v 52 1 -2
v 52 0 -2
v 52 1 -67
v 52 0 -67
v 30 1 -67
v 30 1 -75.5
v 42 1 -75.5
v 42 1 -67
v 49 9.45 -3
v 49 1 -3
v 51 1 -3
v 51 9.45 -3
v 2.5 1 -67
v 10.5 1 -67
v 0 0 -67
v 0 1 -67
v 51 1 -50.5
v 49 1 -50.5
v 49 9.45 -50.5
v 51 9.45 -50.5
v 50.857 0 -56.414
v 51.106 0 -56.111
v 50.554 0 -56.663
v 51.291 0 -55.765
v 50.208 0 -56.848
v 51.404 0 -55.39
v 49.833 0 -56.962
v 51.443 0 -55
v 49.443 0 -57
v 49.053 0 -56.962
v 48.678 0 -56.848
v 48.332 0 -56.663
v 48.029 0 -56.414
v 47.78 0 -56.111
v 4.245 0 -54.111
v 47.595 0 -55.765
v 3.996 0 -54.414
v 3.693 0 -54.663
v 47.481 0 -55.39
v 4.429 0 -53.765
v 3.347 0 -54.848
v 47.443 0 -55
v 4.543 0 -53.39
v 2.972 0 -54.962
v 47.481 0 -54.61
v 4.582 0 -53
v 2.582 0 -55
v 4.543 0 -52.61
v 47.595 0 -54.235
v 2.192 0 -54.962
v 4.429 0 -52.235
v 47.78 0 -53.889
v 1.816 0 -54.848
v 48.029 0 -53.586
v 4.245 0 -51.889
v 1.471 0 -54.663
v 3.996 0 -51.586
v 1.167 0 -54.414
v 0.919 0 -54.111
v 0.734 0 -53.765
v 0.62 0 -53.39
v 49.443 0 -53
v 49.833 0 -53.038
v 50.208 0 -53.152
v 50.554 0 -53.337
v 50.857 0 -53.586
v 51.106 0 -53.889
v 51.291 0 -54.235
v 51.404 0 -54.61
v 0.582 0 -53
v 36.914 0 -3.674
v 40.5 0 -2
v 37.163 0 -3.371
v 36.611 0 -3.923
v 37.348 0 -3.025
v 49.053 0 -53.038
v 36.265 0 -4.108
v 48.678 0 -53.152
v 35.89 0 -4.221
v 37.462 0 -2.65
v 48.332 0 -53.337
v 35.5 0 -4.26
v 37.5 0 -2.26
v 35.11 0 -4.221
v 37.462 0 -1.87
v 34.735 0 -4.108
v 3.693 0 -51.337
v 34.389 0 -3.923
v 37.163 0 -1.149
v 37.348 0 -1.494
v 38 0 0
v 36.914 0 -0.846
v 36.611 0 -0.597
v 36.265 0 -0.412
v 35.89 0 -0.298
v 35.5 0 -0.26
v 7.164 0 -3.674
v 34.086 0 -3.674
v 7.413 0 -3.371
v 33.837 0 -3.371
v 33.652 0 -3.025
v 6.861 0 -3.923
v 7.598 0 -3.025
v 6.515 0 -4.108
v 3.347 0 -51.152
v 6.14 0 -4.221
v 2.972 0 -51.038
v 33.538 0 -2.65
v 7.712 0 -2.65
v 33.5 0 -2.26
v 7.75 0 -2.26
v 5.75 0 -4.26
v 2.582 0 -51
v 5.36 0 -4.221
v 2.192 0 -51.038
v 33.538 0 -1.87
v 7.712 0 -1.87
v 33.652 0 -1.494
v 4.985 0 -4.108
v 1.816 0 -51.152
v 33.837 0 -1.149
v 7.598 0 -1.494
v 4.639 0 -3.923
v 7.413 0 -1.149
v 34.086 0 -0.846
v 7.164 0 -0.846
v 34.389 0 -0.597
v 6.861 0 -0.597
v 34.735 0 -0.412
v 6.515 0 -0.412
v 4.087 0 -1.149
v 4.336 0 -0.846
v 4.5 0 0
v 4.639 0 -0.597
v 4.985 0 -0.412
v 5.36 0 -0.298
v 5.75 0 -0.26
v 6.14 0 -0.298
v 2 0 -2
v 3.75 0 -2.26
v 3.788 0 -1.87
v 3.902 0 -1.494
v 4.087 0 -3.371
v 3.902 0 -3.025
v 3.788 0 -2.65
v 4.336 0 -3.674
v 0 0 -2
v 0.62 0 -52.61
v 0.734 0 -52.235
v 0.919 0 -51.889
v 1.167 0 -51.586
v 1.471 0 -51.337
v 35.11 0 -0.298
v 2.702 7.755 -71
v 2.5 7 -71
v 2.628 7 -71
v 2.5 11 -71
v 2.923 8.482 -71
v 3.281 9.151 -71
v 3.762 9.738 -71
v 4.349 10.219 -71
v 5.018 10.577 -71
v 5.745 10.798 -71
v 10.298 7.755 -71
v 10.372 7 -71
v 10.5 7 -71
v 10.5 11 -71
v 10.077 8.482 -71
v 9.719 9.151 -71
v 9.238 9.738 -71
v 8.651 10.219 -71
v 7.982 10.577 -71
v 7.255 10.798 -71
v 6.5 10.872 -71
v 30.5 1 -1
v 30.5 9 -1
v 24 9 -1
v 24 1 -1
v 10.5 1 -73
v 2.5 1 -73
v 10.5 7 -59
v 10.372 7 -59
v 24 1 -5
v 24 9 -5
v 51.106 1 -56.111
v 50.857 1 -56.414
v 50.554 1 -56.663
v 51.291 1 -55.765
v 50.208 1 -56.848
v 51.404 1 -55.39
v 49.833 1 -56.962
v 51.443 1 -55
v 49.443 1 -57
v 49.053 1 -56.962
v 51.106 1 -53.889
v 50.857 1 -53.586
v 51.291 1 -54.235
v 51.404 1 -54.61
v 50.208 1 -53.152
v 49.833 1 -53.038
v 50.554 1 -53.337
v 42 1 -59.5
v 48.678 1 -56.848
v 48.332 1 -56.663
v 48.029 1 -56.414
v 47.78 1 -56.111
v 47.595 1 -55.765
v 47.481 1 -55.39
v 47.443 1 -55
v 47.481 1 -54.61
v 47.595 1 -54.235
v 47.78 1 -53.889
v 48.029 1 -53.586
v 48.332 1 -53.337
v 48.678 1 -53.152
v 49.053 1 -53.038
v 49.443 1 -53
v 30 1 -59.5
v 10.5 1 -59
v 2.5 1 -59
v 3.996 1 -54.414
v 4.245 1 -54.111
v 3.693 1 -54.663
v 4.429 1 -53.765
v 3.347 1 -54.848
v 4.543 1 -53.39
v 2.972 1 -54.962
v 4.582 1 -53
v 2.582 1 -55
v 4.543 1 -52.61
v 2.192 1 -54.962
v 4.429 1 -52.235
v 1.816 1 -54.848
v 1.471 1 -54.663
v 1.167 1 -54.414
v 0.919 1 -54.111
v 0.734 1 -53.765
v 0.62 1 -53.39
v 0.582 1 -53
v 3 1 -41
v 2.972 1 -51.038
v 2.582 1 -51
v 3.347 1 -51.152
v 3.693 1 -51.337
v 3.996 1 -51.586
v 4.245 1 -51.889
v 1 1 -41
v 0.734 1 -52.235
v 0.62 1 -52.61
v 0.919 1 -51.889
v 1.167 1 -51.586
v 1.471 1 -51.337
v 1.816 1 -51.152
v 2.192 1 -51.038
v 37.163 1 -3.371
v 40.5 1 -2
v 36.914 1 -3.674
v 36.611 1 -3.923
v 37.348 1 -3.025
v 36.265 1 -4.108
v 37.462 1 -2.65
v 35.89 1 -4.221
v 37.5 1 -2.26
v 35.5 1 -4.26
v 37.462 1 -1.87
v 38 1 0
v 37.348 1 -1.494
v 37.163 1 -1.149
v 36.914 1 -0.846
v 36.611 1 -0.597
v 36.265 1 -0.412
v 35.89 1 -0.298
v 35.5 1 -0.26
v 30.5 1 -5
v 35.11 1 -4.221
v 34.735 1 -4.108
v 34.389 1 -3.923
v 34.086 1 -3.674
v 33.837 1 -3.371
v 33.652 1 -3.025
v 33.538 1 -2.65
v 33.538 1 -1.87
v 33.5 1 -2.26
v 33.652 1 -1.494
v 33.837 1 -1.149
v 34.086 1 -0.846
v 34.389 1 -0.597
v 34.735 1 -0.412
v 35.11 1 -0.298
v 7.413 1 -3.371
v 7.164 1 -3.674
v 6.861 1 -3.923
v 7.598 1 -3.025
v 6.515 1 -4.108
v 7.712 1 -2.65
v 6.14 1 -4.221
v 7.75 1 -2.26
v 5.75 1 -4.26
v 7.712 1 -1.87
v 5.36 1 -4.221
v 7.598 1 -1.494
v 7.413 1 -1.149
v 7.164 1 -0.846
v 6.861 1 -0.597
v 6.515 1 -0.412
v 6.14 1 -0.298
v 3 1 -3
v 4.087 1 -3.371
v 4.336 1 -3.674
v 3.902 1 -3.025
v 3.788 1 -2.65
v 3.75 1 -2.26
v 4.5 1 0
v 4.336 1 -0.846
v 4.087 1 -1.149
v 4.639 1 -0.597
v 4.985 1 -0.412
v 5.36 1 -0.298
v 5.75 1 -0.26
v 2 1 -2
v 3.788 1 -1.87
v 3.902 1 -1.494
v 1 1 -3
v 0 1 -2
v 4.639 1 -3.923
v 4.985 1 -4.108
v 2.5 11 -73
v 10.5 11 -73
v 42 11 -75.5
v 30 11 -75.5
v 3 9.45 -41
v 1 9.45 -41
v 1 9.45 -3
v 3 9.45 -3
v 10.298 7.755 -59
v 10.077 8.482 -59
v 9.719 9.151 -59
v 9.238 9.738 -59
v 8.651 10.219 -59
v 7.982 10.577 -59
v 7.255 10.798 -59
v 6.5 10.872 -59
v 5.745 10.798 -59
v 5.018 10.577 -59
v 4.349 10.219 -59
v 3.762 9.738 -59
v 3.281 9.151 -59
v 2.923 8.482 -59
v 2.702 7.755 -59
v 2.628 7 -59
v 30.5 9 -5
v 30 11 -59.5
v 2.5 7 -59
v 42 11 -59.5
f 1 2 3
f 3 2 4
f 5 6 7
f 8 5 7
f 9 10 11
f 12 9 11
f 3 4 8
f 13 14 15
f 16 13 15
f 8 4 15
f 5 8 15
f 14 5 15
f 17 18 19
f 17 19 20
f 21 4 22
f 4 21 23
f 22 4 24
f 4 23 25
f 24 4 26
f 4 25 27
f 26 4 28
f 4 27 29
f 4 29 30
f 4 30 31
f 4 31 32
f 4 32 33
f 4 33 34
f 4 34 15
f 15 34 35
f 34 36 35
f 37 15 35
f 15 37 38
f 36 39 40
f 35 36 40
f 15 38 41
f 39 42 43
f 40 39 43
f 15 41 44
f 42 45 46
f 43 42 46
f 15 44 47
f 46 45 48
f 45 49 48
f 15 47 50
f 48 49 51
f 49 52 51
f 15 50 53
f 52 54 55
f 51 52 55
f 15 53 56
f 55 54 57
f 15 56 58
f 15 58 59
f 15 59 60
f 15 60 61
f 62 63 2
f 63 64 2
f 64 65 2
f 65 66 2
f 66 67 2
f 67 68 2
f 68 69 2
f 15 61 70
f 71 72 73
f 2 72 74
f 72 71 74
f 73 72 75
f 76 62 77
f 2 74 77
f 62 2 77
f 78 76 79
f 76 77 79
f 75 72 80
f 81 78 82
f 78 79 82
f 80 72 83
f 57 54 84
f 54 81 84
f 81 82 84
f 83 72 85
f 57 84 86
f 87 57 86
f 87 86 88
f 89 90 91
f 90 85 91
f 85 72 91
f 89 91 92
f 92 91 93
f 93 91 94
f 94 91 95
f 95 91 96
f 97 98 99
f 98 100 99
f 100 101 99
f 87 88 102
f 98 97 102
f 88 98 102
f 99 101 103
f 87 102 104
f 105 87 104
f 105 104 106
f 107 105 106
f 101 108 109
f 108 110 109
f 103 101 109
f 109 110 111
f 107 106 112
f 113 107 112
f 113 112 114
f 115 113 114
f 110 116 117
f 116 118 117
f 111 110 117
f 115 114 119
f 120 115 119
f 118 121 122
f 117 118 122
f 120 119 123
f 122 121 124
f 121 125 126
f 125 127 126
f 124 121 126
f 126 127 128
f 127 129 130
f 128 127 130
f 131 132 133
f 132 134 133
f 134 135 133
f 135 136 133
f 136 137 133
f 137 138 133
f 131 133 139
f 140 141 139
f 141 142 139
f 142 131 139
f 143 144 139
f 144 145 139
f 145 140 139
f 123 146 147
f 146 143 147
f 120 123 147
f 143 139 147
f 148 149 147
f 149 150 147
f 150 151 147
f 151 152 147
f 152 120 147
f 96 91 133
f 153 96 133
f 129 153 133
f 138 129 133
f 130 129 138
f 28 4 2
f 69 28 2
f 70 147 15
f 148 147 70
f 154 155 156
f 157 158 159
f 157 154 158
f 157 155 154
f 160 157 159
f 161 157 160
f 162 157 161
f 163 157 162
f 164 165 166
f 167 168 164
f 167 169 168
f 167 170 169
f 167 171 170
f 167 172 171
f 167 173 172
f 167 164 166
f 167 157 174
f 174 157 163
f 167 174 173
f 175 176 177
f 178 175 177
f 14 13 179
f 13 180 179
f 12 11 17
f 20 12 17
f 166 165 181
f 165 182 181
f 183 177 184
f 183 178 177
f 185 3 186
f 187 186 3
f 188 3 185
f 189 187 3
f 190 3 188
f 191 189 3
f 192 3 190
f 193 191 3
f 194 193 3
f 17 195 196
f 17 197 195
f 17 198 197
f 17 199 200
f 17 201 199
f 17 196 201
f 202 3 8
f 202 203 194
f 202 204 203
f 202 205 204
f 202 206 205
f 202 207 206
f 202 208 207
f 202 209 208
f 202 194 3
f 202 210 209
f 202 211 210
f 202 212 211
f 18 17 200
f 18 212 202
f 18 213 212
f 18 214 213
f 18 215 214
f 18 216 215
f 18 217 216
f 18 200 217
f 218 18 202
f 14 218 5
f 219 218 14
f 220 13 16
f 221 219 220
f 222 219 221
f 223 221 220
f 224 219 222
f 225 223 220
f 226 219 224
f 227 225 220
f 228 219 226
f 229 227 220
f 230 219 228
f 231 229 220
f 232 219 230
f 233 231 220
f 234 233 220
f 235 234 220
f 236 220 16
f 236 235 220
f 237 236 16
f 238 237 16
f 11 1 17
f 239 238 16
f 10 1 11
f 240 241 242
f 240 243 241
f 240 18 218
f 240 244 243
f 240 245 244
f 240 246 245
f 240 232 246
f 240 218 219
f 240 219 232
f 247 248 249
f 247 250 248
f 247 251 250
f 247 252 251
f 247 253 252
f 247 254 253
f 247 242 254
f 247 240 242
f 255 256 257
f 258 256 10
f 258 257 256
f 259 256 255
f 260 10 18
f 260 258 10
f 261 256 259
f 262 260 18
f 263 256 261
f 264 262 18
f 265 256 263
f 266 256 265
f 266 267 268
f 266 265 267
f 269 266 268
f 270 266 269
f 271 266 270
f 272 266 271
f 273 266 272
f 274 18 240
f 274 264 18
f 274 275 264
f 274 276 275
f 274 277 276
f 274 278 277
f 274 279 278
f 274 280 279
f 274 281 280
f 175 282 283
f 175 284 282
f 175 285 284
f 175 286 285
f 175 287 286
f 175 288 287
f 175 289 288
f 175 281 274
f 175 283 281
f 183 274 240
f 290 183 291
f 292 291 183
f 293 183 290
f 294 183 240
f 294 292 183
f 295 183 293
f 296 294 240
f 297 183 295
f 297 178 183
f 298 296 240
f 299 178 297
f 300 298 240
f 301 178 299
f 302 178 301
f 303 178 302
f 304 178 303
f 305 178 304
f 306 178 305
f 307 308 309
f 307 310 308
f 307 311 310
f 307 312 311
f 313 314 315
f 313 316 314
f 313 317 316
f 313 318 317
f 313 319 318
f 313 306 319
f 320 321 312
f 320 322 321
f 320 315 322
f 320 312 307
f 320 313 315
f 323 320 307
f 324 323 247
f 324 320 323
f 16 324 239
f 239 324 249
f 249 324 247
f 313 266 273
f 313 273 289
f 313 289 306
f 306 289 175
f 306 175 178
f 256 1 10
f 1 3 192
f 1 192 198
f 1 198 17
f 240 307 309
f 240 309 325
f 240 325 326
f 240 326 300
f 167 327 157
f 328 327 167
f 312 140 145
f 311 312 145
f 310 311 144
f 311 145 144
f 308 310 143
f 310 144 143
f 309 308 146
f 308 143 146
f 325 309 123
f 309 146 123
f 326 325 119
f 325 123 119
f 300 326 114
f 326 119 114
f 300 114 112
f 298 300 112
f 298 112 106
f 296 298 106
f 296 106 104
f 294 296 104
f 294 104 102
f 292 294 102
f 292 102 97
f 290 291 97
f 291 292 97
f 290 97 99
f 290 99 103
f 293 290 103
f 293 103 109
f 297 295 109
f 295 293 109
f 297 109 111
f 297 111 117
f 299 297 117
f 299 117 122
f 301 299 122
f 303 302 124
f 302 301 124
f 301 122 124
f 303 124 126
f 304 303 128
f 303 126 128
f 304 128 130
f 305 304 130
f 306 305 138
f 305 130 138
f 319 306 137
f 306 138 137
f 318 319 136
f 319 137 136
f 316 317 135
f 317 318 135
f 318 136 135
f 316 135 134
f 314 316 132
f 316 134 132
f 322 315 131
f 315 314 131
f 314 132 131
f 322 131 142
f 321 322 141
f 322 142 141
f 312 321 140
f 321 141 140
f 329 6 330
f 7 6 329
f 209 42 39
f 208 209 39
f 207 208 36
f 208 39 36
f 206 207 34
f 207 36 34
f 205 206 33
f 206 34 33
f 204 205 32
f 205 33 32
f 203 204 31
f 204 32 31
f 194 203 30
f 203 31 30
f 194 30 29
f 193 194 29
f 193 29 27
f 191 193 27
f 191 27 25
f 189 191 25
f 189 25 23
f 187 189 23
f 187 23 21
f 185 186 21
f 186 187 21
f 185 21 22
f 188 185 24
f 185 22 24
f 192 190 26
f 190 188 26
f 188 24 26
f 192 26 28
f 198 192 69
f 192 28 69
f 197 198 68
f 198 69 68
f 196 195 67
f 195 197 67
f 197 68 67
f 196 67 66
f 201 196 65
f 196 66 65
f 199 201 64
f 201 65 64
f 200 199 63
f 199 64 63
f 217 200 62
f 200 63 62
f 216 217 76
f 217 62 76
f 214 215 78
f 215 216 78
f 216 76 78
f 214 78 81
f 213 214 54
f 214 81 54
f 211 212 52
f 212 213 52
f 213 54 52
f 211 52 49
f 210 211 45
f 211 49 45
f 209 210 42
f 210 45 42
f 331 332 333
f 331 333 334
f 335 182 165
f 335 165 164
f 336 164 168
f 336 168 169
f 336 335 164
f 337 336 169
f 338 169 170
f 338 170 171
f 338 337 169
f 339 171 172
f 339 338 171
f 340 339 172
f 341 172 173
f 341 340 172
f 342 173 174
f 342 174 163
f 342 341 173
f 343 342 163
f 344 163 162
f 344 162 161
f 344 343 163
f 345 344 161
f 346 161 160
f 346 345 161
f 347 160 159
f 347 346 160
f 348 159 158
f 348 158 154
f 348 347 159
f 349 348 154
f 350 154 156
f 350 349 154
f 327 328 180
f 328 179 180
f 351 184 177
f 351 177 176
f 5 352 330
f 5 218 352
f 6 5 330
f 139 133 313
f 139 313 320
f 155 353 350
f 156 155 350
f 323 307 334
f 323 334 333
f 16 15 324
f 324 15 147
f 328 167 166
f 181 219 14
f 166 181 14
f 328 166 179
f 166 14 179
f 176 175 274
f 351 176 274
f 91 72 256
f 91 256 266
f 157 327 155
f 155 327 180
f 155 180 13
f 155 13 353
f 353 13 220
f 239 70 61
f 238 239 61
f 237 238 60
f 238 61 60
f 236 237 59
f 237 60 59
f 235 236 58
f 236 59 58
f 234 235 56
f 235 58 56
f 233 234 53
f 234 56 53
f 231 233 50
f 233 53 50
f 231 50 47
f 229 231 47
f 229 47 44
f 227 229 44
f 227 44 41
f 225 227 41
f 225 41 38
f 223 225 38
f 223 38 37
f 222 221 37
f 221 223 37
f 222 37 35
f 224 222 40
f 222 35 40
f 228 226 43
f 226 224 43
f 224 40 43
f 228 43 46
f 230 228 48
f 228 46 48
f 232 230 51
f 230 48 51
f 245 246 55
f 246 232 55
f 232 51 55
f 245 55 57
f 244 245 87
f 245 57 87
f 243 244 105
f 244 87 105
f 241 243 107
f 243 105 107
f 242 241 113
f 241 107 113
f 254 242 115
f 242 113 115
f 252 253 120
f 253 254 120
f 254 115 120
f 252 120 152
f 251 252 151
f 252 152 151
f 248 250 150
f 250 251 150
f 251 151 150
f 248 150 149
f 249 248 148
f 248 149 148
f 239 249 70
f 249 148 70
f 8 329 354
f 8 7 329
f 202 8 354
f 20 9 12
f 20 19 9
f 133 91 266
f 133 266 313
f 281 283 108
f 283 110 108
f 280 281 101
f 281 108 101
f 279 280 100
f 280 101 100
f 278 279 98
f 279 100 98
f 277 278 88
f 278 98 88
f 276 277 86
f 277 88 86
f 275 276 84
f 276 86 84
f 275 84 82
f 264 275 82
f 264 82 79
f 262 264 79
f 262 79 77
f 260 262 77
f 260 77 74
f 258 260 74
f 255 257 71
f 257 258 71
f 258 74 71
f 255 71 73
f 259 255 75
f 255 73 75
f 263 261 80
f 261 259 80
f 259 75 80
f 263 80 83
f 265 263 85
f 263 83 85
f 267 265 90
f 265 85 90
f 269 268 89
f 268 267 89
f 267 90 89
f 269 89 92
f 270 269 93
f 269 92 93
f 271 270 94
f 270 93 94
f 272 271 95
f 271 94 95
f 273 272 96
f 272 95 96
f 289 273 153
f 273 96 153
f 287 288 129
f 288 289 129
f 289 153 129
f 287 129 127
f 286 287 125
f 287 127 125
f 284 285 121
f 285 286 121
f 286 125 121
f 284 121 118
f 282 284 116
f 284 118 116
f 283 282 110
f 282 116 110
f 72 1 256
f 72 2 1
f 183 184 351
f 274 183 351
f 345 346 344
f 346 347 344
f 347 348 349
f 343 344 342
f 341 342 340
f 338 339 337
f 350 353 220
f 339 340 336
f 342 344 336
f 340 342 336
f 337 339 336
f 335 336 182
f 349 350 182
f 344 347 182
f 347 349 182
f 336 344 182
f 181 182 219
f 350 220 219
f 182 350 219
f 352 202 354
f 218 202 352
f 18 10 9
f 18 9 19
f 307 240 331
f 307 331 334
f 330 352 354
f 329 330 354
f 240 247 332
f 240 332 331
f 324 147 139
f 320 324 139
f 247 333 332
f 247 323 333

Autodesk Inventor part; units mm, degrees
ref_plane "YZ Plane" through (0, 0, 0) normal (1, 0, 0) x (0, 1, 0)
ref_plane "XZ Plane" through (0, 0, 0) normal (0, 1, 0) x (-1, 0, 0)
ref_plane "XY Plane" through (0, 0, 0) normal (0, 0, 1) x (1, 0, 0)
sketch "Boceto1" plane through (0, 0, 0) normal (0, 1, 0) x (-1, 0, 0)
  line L0 (-52, -2) -> (-52, -55)
  line L1 (-52, -67) -> (0, -67)
  line L2 (0, -67) -> (0, -2)
  line L3 (-52, -2) -> (-40.5, -2)
  line L4 (-40.5, -2) -> (-38, 0)
  line L5 (-38, 0) -> (-4.5, 0)
  line L6 (0, -2) -> (-2, -2)
  line L7 (-4.5, 0) -> (-2, -2)
  line L8 (-52, -67) -> (-52, -55)
  circle A0 centre (-49.4429, -55) radius 2
  circle A1 centre (-2.5817, -53) radius 2
  circle A2 centre (-35.5, -2.2598) radius 2
  line L9 (-4.5, 0) -> (-7, 0)
  circle A3 centre (-5.75, -2.2598) radius 2
  point P0 (0, 0)
extrude "Extrusión1" add sketch "Boceto1" along normal blind 1
sketch "Boceto2" plane through (0, 1, 0) normal (0, 1, 0) x (1, 0, 0)
  line L0 (49, 3) -> (51, 3)
  line L1 (51, 3) -> (51, 50.5)
  line L2 (40.5, 2) -> (52, 2) projected
  line L3 (52, 2) -> (52, 67) projected
  line L4 (49, 3) -> (49, 50.5)
  line L5 (49, 50.5) -> (51, 50.5)
  line L6 (1.1059, 3) -> (3, 3)
  line L7 (0, 2) -> (2, 2) projected
  line L8 (0, 67) -> (0, 2) projected
  line L9 (1.1059, 3) -> (1, 3)
  line L10 (1, 3) -> (1, 41)
  line L11 (1, 41) -> (3.1059, 41)
  line L12 (3, 41) -> (3, 3)
  point P0 (0, 0)
extrude "Extrusión2" add sketch "Boceto2" along normal blind 8.45
sketch "Boceto3" plane through (0, 1, 0) normal (0, 1, 0) x (1, 0, 0)
  line L0 (30.5, 1) -> (30.5, 5)
  line L1 (24, 1) -> (24, 5)
  line L2 (24, 5) -> (30.5, 5)
  line L3 (30.5, 1) -> (24, 1)
  point P0 (0, 0)
  point P1 (38, 0)
extrude "Extrusión3" add sketch "Boceto3" along normal blind 8
sketch "Boceto4" plane through (0, 1, 0) normal (0, 1, 0) x (1, 0, 0)
  line L0 (42, 67) -> (42, 59.5)
  line L1 (42, 59.5) -> (30, 59.5)
  line L2 (30, 59.5) -> (30, 75.5)
  line L3 (30, 75.5) -> (42, 75.5)
  line L4 (42, 75.5) -> (42, 67)
  point P0 (0, 0)
  point P1 (52, 67)
extrude "Extrusión4" add sketch "Boceto4" along normal blind 10
sketch "Boceto5" plane through (0, 1, 0) normal (0, 1, 0) x (1, 0, 0)
  line L0 (2.5, 67) -> (2.5, 59)
  line L1 (2.5, 59) -> (10.5, 59)
  line L2 (10.5, 59) -> (10.5, 73)
  line L3 (10.5, 73) -> (2.5, 73)
  line L4 (2.5, 73) -> (2.5, 67)
  point P0 (0, 0)
  point P1 (0, 67)
extrude "Extrusión5" add sketch "Boceto5" along normal blind 10
sketch "Boceto6" plane through (2.5, 1, -59) normal (0, 0, 1) x (1, 0, 0)
  line L0 (0, 10) -> (8, 10) projected
  arc A0 (7.8719, 6) -> (0.1281, 6) centre (4, 6) ccw
  line L1 (8, 0) -> (8, 10) projected
  line L2 (0, 6) -> (0.1281, 6)
  line L3 (7.8719, 6) -> (8, 6)
  line L4 (8, 6) -> (8, 10)
  line L5 (0, 10) -> (8, 10)
  line L6 (0, 0) -> (0, 10) projected
  line L7 (0, 10) -> (0, 6)
  point P0 (-2.5, -1)
extrude "Extrusión6" cut sketch "Boceto6" against normal blind 12
sketch "Boceto7" plane through (0, 1, 0) normal (0, 1, 0) x (1, 0, 0)
  line L0 (33.4324, 46.0381) -> (33.4324, 19.5952) construction
  line L1 (33.4324, 19.5952) -> (29.7026, 19.5952) construction
  line L2 (29.7026, 19.5952) -> (29.7026, 46.0381) construction
  line L3 (29.7026, 46.0381) -> (33.4324, 46.0381) construction
equation "\"Radio_pliegue\" = Grosor"
equation "\"Anchura_desahogo_plegado\" = Grosor"
equation "\"Profundidad_desahogo_plegado\" = 0.5 * Grosor"
equation "\"Tamaño_destalonado\" = 4 * Grosor"
equation "\"Remanente_mínimo\" = 2 * Grosor"
equation "\"Radiodetransición\" = Radio_pliegue"
equation "\"Tamaño_de_radio_de_Jacobi\" = Radio_pliegue"
equation "\"TamañoSeparación\" = Grosor"
equation "\"Grosor\" = 0.5"
properties part number "arduino uno"
